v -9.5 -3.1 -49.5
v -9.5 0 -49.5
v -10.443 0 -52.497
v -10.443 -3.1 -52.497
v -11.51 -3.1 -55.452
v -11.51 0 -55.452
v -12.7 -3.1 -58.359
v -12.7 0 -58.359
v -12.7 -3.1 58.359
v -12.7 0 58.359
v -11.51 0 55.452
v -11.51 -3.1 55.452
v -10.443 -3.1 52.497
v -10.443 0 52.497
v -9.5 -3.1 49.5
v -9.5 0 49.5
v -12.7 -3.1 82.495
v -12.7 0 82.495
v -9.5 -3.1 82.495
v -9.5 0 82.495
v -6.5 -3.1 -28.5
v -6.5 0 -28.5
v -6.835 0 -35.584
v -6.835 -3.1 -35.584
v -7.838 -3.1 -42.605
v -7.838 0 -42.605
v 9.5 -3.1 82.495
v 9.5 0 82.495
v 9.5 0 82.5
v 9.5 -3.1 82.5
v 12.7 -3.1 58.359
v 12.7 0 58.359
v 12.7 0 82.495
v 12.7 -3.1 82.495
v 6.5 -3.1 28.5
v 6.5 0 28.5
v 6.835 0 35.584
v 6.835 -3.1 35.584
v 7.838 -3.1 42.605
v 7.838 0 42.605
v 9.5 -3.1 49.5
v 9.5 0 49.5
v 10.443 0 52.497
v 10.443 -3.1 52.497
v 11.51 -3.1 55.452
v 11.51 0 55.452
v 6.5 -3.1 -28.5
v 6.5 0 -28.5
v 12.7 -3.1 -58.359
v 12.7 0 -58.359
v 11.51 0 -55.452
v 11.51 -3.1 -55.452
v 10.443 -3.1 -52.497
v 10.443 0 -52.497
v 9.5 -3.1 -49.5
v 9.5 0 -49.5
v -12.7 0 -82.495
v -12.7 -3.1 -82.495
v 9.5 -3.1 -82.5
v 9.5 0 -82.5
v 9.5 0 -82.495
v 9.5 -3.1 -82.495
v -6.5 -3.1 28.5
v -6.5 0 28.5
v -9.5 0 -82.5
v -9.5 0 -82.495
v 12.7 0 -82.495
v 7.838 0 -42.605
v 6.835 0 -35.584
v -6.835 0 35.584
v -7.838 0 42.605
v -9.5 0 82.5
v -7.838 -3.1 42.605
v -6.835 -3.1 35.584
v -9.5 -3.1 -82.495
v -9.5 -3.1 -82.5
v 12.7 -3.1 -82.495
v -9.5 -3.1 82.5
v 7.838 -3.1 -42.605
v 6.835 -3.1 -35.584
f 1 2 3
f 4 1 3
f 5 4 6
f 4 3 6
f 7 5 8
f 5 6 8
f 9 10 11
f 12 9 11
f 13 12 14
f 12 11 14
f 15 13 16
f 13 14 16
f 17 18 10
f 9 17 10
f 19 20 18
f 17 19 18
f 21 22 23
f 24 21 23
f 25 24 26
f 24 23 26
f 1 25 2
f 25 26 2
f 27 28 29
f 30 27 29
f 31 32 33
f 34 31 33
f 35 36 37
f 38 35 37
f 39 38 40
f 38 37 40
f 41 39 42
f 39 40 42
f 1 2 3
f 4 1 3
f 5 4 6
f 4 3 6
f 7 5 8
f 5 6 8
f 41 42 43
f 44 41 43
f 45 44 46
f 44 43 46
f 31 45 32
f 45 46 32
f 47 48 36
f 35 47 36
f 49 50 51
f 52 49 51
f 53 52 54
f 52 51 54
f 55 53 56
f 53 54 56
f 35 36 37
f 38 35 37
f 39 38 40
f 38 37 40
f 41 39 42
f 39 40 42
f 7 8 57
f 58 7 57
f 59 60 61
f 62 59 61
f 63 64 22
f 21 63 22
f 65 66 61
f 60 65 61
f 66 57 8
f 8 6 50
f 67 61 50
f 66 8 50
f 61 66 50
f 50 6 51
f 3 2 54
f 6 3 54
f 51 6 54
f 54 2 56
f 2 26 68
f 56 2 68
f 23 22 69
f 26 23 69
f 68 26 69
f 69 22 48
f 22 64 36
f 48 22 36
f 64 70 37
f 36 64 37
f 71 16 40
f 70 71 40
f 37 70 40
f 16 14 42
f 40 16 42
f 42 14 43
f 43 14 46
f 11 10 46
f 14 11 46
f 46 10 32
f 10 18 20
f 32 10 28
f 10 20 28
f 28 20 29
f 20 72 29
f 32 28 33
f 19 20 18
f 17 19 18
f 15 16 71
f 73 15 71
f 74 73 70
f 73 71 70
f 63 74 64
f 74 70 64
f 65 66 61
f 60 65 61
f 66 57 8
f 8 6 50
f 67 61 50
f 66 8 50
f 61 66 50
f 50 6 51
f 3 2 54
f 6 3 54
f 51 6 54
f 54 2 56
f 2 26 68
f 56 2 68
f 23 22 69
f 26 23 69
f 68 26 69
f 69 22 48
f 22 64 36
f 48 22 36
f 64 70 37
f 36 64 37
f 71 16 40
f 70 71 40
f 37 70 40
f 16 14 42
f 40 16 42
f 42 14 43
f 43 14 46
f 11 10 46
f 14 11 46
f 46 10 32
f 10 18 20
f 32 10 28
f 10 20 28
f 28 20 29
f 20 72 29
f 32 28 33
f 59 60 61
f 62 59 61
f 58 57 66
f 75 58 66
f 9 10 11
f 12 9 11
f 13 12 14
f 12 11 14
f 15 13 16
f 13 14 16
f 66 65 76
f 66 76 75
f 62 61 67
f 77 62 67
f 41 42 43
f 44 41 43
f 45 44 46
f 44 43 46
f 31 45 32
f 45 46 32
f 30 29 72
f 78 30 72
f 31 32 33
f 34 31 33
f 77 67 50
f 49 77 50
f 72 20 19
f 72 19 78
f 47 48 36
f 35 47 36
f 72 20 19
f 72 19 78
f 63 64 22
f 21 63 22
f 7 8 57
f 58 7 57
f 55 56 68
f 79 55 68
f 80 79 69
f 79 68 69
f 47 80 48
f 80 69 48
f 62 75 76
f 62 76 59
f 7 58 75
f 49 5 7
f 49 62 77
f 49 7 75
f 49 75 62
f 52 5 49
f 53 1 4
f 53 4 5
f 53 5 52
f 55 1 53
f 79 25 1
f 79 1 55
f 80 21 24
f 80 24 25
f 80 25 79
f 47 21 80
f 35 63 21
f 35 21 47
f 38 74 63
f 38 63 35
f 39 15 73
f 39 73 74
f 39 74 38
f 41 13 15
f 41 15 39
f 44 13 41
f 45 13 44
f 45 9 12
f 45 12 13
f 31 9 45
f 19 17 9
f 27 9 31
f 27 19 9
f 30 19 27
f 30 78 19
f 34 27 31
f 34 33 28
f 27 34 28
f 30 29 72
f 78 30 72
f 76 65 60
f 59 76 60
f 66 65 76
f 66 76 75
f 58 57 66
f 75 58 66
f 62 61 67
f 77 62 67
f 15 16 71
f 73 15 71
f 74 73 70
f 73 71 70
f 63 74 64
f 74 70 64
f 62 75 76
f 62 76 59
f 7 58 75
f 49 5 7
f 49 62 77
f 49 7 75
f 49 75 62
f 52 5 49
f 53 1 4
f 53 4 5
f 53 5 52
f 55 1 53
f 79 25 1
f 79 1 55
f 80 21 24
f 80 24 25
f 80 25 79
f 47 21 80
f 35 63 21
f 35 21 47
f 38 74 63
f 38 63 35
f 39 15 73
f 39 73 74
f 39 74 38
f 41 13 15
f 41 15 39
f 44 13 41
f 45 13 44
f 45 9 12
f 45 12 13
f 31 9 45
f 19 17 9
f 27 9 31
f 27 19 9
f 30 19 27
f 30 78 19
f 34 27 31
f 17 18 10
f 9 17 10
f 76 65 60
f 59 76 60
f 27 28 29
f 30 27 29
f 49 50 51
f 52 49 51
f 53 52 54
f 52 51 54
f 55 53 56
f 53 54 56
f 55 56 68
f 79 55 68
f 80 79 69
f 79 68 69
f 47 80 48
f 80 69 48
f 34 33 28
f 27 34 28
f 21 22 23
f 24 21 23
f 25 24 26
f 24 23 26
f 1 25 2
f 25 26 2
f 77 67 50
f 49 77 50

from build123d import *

# Parameters (mm, degrees)
F0_W     = 6.5
F0_H     = 28.5
F0_W_2   = 9.5
F0_H_2   = 32.9946
F0_H_3   = 0.0054
F1_DEPTH = 3.1
F2_DEPTH = 3.1


with BuildPart() as f1:
    # F0 (on Front) → F1 (new body)
    with BuildSketch(Plane.XZ):
        with BuildLine():
            ThreePointArc((-9.5, 49.5), (-7.2537879754, 39.1066017178), (-6.5, 28.5))
            Line((-6.5, 28.5), (0, 28.5))
            Line((0, 28.5), (0, 49.5))
            Line((0, 49.5), (-9.5, 49.5))
        make_face()
        with Locations((-3.25, 14.25)):
            Rectangle(F0_W, F0_H)
        with Locations((3.25, 14.25)):
            Rectangle(F0_W, F0_H)
        with BuildLine():
            Line((0, 49.5), (0, 28.5))
            Line((0, 28.5), (6.5, 28.5))
            ThreePointArc((6.5, 28.5), (7.2537879754, 39.1066017178), (9.5, 49.5))
            Line((9.5, 49.5), (0, 49.5))
        make_face()
        with Locations((-3.25, -14.25)):
            Rectangle(F0_W, F0_H)
        with Locations((-4.75, 65.9973)):
            Rectangle(F0_W_2, F0_H_2)
        with BuildLine():
            ThreePointArc((-12.7, 58.3590019927), (-10.9607876492, 53.9797865164), (-9.5, 49.5))
            Line((-9.5, 49.5), (-9.5, 82.4946))
            Line((-9.5, 82.4946), (-12.7, 82.4946))
            Line((-12.7, 82.4946), (-12.7, 58.3590019927))
        make_face()
        with Locations((3.25, -14.25)):
            Rectangle(F0_W, F0_H)
        with Locations((4.75, 65.9973)):
            Rectangle(F0_W_2, F0_H_2)
        with BuildLine():
            Line((0, -28.5), (-6.5, -28.5))
            ThreePointArc((-6.5, -28.5), (-7.2537879754, -39.1066017178), (-9.5, -49.5))
            Line((-9.5, -49.5), (0, -49.5))
            Line((0, -49.5), (0, -28.5))
        make_face()
        with Locations((-4.75, 82.4973)):
            Rectangle(F0_W_2, F0_H_3)
        with BuildLine():
            Line((6.5, -28.5), (0, -28.5))
            Line((0, -28.5), (0, -49.5))
            Line((0, -49.5), (9.5, -49.5))
            ThreePointArc((9.5, -49.5), (7.2537879754, -39.1066017178), (6.5, -28.5))
        make_face()
        with Locations((4.75, 82.4973)):
            Rectangle(F0_W_2, F0_H_3)
        with BuildLine():
            Line((9.5, 82.4946), (9.5, 49.5))
            ThreePointArc((9.5, 49.5), (10.9607876492, 53.9797865164), (12.7, 58.3590019927))
            Line((12.7, 58.3590019927), (12.7, 82.4946))
            Line((12.7, 82.4946), (9.5, 82.4946))
        make_face()
        Polygon((0, -49.5), (-9.5, -49.5), (-9.5, -82.4946), (0, -82.4946), (0, -55.7), align=None)
        with BuildLine():
            Line((-9.5, -82.4946), (-9.5, -49.5))
            ThreePointArc((-9.5, -49.5), (-10.9607876492, -53.9797865164), (-12.7, -58.3590019927))
            Line((-12.7, -58.3590019927), (-12.7, -82.4946))
            Line((-12.7, -82.4946), (-9.5, -82.4946))
        make_face()
        Polygon((9.5, -49.5), (0, -49.5), (0, -55.7), (0, -82.4946), (9.5, -82.4946), align=None)
        with Locations((-4.75, -82.4973)):
            Rectangle(F0_W_2, F0_H_3)
        with BuildLine():
            ThreePointArc((12.7, -58.3590019927), (10.9607876492, -53.9797865164), (9.5, -49.5))
            Line((9.5, -49.5), (9.5, -82.4946))
            Line((9.5, -82.4946), (12.7, -82.4946))
            Line((12.7, -82.4946), (12.7, -58.3590019927))
        make_face()
        with Locations((4.75, -82.4973)):
            Rectangle(F0_W_2, F0_H_3)
    extrude(amount=F1_DEPTH)


with BuildPart() as f2:
    # F0 (on Front) → F2 (new body)
    with BuildSketch(Plane.XZ):
        with BuildLine():
            ThreePointArc((-9.5, 49.5), (-7.2537879754, 39.1066017178), (-6.5, 28.5))
            Line((-6.5, 28.5), (0, 28.5))
            Line((0, 28.5), (0, 49.5))
            Line((0, 49.5), (-9.5, 49.5))
        make_face()
        with Locations((-3.25, 14.25)):
            Rectangle(F0_W, F0_H)
        with Locations((3.25, 14.25)):
            Rectangle(F0_W, F0_H)
        with BuildLine():
            Line((0, 49.5), (0, 28.5))
            Line((0, 28.5), (6.5, 28.5))
            ThreePointArc((6.5, 28.5), (7.2537879754, 39.1066017178), (9.5, 49.5))
            Line((9.5, 49.5), (0, 49.5))
        make_face()
        with Locations((-3.25, -14.25)):
            Rectangle(F0_W, F0_H)
        with Locations((-4.75, 65.9973)):
            Rectangle(F0_W_2, F0_H_2)
        with BuildLine():
            ThreePointArc((-12.7, 58.3590019927), (-10.9607876492, 53.9797865164), (-9.5, 49.5))
            Line((-9.5, 49.5), (-9.5, 82.4946))
            Line((-9.5, 82.4946), (-12.7, 82.4946))
            Line((-12.7, 82.4946), (-12.7, 58.3590019927))
        make_face()
        with Locations((3.25, -14.25)):
            Rectangle(F0_W, F0_H)
        with Locations((4.75, 65.9973)):
            Rectangle(F0_W_2, F0_H_2)
        with BuildLine():
            Line((0, -28.5), (-6.5, -28.5))
            ThreePointArc((-6.5, -28.5), (-7.2537879754, -39.1066017178), (-9.5, -49.5))
            Line((-9.5, -49.5), (0, -49.5))
            Line((0, -49.5), (0, -28.5))
        make_face()
        with Locations((-4.75, 82.4973)):
            Rectangle(F0_W_2, F0_H_3)
        with BuildLine():
            Line((6.5, -28.5), (0, -28.5))
            Line((0, -28.5), (0, -49.5))
            Line((0, -49.5), (9.5, -49.5))
            ThreePointArc((9.5, -49.5), (7.2537879754, -39.1066017178), (6.5, -28.5))
        make_face()
        with Locations((4.75, 82.4973)):
            Rectangle(F0_W_2, F0_H_3)
        with BuildLine():
            Line((9.5, 82.4946), (9.5, 49.5))
            ThreePointArc((9.5, 49.5), (10.9607876492, 53.9797865164), (12.7, 58.3590019927))
            Line((12.7, 58.3590019927), (12.7, 82.4946))
            Line((12.7, 82.4946), (9.5, 82.4946))
        make_face()
        Polygon((0, -49.5), (-9.5, -49.5), (-9.5, -82.4946), (0, -82.4946), (0, -55.7), align=None)
        with BuildLine():
            Line((-9.5, -82.4946), (-9.5, -49.5))
            ThreePointArc((-9.5, -49.5), (-10.9607876492, -53.9797865164), (-12.7, -58.3590019927))
            Line((-12.7, -58.3590019927), (-12.7, -82.4946))
            Line((-12.7, -82.4946), (-9.5, -82.4946))
        make_face()
        Polygon((9.5, -49.5), (0, -49.5), (0, -55.7), (0, -82.4946), (9.5, -82.4946), align=None)
        with Locations((-4.75, -82.4973)):
            Rectangle(F0_W_2, F0_H_3)
        with BuildLine():
            ThreePointArc((12.7, -58.3590019927), (10.9607876492, -53.9797865164), (9.5, -49.5))
            Line((9.5, -49.5), (9.5, -82.4946))
            Line((9.5, -82.4946), (12.7, -82.4946))
            Line((12.7, -82.4946), (12.7, -58.3590019927))
        make_face()
        with Locations((4.75, -82.4973)):
            Rectangle(F0_W_2, F0_H_3)
    extrude(amount=F2_DEPTH)


solid = Compound([f1.part, f2.part])
